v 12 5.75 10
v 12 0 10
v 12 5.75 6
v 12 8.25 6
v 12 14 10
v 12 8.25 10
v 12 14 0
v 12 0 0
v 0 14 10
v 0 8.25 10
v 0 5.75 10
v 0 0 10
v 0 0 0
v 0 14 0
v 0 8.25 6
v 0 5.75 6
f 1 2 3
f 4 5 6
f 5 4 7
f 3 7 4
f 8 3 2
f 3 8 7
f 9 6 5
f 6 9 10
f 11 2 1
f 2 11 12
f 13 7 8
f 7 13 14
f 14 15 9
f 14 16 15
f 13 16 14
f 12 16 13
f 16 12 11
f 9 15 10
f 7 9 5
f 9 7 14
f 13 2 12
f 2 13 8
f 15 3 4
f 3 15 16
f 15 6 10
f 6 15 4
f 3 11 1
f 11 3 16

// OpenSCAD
$fn = 32;

// ----------------------------------------------------------------------
// Micro clip: slotted block, 5-20 mm class
// ----------------------------------------------------------------------

// --- parameters (mm) ---
block_l = 12;             // block length, X
block_w = 14;             // block width, Y
block_h = 10;             // block height, Z
slot_w = 2.5;             // slot width
slot_d = 4;               // slot depth from the top

difference() {
  cube([block_l, block_w, block_h]);
  translate([-1, block_w / 2 - slot_w / 2, block_h - slot_d])
    cube([block_l + 2, slot_w, slot_d + 1]);
}
